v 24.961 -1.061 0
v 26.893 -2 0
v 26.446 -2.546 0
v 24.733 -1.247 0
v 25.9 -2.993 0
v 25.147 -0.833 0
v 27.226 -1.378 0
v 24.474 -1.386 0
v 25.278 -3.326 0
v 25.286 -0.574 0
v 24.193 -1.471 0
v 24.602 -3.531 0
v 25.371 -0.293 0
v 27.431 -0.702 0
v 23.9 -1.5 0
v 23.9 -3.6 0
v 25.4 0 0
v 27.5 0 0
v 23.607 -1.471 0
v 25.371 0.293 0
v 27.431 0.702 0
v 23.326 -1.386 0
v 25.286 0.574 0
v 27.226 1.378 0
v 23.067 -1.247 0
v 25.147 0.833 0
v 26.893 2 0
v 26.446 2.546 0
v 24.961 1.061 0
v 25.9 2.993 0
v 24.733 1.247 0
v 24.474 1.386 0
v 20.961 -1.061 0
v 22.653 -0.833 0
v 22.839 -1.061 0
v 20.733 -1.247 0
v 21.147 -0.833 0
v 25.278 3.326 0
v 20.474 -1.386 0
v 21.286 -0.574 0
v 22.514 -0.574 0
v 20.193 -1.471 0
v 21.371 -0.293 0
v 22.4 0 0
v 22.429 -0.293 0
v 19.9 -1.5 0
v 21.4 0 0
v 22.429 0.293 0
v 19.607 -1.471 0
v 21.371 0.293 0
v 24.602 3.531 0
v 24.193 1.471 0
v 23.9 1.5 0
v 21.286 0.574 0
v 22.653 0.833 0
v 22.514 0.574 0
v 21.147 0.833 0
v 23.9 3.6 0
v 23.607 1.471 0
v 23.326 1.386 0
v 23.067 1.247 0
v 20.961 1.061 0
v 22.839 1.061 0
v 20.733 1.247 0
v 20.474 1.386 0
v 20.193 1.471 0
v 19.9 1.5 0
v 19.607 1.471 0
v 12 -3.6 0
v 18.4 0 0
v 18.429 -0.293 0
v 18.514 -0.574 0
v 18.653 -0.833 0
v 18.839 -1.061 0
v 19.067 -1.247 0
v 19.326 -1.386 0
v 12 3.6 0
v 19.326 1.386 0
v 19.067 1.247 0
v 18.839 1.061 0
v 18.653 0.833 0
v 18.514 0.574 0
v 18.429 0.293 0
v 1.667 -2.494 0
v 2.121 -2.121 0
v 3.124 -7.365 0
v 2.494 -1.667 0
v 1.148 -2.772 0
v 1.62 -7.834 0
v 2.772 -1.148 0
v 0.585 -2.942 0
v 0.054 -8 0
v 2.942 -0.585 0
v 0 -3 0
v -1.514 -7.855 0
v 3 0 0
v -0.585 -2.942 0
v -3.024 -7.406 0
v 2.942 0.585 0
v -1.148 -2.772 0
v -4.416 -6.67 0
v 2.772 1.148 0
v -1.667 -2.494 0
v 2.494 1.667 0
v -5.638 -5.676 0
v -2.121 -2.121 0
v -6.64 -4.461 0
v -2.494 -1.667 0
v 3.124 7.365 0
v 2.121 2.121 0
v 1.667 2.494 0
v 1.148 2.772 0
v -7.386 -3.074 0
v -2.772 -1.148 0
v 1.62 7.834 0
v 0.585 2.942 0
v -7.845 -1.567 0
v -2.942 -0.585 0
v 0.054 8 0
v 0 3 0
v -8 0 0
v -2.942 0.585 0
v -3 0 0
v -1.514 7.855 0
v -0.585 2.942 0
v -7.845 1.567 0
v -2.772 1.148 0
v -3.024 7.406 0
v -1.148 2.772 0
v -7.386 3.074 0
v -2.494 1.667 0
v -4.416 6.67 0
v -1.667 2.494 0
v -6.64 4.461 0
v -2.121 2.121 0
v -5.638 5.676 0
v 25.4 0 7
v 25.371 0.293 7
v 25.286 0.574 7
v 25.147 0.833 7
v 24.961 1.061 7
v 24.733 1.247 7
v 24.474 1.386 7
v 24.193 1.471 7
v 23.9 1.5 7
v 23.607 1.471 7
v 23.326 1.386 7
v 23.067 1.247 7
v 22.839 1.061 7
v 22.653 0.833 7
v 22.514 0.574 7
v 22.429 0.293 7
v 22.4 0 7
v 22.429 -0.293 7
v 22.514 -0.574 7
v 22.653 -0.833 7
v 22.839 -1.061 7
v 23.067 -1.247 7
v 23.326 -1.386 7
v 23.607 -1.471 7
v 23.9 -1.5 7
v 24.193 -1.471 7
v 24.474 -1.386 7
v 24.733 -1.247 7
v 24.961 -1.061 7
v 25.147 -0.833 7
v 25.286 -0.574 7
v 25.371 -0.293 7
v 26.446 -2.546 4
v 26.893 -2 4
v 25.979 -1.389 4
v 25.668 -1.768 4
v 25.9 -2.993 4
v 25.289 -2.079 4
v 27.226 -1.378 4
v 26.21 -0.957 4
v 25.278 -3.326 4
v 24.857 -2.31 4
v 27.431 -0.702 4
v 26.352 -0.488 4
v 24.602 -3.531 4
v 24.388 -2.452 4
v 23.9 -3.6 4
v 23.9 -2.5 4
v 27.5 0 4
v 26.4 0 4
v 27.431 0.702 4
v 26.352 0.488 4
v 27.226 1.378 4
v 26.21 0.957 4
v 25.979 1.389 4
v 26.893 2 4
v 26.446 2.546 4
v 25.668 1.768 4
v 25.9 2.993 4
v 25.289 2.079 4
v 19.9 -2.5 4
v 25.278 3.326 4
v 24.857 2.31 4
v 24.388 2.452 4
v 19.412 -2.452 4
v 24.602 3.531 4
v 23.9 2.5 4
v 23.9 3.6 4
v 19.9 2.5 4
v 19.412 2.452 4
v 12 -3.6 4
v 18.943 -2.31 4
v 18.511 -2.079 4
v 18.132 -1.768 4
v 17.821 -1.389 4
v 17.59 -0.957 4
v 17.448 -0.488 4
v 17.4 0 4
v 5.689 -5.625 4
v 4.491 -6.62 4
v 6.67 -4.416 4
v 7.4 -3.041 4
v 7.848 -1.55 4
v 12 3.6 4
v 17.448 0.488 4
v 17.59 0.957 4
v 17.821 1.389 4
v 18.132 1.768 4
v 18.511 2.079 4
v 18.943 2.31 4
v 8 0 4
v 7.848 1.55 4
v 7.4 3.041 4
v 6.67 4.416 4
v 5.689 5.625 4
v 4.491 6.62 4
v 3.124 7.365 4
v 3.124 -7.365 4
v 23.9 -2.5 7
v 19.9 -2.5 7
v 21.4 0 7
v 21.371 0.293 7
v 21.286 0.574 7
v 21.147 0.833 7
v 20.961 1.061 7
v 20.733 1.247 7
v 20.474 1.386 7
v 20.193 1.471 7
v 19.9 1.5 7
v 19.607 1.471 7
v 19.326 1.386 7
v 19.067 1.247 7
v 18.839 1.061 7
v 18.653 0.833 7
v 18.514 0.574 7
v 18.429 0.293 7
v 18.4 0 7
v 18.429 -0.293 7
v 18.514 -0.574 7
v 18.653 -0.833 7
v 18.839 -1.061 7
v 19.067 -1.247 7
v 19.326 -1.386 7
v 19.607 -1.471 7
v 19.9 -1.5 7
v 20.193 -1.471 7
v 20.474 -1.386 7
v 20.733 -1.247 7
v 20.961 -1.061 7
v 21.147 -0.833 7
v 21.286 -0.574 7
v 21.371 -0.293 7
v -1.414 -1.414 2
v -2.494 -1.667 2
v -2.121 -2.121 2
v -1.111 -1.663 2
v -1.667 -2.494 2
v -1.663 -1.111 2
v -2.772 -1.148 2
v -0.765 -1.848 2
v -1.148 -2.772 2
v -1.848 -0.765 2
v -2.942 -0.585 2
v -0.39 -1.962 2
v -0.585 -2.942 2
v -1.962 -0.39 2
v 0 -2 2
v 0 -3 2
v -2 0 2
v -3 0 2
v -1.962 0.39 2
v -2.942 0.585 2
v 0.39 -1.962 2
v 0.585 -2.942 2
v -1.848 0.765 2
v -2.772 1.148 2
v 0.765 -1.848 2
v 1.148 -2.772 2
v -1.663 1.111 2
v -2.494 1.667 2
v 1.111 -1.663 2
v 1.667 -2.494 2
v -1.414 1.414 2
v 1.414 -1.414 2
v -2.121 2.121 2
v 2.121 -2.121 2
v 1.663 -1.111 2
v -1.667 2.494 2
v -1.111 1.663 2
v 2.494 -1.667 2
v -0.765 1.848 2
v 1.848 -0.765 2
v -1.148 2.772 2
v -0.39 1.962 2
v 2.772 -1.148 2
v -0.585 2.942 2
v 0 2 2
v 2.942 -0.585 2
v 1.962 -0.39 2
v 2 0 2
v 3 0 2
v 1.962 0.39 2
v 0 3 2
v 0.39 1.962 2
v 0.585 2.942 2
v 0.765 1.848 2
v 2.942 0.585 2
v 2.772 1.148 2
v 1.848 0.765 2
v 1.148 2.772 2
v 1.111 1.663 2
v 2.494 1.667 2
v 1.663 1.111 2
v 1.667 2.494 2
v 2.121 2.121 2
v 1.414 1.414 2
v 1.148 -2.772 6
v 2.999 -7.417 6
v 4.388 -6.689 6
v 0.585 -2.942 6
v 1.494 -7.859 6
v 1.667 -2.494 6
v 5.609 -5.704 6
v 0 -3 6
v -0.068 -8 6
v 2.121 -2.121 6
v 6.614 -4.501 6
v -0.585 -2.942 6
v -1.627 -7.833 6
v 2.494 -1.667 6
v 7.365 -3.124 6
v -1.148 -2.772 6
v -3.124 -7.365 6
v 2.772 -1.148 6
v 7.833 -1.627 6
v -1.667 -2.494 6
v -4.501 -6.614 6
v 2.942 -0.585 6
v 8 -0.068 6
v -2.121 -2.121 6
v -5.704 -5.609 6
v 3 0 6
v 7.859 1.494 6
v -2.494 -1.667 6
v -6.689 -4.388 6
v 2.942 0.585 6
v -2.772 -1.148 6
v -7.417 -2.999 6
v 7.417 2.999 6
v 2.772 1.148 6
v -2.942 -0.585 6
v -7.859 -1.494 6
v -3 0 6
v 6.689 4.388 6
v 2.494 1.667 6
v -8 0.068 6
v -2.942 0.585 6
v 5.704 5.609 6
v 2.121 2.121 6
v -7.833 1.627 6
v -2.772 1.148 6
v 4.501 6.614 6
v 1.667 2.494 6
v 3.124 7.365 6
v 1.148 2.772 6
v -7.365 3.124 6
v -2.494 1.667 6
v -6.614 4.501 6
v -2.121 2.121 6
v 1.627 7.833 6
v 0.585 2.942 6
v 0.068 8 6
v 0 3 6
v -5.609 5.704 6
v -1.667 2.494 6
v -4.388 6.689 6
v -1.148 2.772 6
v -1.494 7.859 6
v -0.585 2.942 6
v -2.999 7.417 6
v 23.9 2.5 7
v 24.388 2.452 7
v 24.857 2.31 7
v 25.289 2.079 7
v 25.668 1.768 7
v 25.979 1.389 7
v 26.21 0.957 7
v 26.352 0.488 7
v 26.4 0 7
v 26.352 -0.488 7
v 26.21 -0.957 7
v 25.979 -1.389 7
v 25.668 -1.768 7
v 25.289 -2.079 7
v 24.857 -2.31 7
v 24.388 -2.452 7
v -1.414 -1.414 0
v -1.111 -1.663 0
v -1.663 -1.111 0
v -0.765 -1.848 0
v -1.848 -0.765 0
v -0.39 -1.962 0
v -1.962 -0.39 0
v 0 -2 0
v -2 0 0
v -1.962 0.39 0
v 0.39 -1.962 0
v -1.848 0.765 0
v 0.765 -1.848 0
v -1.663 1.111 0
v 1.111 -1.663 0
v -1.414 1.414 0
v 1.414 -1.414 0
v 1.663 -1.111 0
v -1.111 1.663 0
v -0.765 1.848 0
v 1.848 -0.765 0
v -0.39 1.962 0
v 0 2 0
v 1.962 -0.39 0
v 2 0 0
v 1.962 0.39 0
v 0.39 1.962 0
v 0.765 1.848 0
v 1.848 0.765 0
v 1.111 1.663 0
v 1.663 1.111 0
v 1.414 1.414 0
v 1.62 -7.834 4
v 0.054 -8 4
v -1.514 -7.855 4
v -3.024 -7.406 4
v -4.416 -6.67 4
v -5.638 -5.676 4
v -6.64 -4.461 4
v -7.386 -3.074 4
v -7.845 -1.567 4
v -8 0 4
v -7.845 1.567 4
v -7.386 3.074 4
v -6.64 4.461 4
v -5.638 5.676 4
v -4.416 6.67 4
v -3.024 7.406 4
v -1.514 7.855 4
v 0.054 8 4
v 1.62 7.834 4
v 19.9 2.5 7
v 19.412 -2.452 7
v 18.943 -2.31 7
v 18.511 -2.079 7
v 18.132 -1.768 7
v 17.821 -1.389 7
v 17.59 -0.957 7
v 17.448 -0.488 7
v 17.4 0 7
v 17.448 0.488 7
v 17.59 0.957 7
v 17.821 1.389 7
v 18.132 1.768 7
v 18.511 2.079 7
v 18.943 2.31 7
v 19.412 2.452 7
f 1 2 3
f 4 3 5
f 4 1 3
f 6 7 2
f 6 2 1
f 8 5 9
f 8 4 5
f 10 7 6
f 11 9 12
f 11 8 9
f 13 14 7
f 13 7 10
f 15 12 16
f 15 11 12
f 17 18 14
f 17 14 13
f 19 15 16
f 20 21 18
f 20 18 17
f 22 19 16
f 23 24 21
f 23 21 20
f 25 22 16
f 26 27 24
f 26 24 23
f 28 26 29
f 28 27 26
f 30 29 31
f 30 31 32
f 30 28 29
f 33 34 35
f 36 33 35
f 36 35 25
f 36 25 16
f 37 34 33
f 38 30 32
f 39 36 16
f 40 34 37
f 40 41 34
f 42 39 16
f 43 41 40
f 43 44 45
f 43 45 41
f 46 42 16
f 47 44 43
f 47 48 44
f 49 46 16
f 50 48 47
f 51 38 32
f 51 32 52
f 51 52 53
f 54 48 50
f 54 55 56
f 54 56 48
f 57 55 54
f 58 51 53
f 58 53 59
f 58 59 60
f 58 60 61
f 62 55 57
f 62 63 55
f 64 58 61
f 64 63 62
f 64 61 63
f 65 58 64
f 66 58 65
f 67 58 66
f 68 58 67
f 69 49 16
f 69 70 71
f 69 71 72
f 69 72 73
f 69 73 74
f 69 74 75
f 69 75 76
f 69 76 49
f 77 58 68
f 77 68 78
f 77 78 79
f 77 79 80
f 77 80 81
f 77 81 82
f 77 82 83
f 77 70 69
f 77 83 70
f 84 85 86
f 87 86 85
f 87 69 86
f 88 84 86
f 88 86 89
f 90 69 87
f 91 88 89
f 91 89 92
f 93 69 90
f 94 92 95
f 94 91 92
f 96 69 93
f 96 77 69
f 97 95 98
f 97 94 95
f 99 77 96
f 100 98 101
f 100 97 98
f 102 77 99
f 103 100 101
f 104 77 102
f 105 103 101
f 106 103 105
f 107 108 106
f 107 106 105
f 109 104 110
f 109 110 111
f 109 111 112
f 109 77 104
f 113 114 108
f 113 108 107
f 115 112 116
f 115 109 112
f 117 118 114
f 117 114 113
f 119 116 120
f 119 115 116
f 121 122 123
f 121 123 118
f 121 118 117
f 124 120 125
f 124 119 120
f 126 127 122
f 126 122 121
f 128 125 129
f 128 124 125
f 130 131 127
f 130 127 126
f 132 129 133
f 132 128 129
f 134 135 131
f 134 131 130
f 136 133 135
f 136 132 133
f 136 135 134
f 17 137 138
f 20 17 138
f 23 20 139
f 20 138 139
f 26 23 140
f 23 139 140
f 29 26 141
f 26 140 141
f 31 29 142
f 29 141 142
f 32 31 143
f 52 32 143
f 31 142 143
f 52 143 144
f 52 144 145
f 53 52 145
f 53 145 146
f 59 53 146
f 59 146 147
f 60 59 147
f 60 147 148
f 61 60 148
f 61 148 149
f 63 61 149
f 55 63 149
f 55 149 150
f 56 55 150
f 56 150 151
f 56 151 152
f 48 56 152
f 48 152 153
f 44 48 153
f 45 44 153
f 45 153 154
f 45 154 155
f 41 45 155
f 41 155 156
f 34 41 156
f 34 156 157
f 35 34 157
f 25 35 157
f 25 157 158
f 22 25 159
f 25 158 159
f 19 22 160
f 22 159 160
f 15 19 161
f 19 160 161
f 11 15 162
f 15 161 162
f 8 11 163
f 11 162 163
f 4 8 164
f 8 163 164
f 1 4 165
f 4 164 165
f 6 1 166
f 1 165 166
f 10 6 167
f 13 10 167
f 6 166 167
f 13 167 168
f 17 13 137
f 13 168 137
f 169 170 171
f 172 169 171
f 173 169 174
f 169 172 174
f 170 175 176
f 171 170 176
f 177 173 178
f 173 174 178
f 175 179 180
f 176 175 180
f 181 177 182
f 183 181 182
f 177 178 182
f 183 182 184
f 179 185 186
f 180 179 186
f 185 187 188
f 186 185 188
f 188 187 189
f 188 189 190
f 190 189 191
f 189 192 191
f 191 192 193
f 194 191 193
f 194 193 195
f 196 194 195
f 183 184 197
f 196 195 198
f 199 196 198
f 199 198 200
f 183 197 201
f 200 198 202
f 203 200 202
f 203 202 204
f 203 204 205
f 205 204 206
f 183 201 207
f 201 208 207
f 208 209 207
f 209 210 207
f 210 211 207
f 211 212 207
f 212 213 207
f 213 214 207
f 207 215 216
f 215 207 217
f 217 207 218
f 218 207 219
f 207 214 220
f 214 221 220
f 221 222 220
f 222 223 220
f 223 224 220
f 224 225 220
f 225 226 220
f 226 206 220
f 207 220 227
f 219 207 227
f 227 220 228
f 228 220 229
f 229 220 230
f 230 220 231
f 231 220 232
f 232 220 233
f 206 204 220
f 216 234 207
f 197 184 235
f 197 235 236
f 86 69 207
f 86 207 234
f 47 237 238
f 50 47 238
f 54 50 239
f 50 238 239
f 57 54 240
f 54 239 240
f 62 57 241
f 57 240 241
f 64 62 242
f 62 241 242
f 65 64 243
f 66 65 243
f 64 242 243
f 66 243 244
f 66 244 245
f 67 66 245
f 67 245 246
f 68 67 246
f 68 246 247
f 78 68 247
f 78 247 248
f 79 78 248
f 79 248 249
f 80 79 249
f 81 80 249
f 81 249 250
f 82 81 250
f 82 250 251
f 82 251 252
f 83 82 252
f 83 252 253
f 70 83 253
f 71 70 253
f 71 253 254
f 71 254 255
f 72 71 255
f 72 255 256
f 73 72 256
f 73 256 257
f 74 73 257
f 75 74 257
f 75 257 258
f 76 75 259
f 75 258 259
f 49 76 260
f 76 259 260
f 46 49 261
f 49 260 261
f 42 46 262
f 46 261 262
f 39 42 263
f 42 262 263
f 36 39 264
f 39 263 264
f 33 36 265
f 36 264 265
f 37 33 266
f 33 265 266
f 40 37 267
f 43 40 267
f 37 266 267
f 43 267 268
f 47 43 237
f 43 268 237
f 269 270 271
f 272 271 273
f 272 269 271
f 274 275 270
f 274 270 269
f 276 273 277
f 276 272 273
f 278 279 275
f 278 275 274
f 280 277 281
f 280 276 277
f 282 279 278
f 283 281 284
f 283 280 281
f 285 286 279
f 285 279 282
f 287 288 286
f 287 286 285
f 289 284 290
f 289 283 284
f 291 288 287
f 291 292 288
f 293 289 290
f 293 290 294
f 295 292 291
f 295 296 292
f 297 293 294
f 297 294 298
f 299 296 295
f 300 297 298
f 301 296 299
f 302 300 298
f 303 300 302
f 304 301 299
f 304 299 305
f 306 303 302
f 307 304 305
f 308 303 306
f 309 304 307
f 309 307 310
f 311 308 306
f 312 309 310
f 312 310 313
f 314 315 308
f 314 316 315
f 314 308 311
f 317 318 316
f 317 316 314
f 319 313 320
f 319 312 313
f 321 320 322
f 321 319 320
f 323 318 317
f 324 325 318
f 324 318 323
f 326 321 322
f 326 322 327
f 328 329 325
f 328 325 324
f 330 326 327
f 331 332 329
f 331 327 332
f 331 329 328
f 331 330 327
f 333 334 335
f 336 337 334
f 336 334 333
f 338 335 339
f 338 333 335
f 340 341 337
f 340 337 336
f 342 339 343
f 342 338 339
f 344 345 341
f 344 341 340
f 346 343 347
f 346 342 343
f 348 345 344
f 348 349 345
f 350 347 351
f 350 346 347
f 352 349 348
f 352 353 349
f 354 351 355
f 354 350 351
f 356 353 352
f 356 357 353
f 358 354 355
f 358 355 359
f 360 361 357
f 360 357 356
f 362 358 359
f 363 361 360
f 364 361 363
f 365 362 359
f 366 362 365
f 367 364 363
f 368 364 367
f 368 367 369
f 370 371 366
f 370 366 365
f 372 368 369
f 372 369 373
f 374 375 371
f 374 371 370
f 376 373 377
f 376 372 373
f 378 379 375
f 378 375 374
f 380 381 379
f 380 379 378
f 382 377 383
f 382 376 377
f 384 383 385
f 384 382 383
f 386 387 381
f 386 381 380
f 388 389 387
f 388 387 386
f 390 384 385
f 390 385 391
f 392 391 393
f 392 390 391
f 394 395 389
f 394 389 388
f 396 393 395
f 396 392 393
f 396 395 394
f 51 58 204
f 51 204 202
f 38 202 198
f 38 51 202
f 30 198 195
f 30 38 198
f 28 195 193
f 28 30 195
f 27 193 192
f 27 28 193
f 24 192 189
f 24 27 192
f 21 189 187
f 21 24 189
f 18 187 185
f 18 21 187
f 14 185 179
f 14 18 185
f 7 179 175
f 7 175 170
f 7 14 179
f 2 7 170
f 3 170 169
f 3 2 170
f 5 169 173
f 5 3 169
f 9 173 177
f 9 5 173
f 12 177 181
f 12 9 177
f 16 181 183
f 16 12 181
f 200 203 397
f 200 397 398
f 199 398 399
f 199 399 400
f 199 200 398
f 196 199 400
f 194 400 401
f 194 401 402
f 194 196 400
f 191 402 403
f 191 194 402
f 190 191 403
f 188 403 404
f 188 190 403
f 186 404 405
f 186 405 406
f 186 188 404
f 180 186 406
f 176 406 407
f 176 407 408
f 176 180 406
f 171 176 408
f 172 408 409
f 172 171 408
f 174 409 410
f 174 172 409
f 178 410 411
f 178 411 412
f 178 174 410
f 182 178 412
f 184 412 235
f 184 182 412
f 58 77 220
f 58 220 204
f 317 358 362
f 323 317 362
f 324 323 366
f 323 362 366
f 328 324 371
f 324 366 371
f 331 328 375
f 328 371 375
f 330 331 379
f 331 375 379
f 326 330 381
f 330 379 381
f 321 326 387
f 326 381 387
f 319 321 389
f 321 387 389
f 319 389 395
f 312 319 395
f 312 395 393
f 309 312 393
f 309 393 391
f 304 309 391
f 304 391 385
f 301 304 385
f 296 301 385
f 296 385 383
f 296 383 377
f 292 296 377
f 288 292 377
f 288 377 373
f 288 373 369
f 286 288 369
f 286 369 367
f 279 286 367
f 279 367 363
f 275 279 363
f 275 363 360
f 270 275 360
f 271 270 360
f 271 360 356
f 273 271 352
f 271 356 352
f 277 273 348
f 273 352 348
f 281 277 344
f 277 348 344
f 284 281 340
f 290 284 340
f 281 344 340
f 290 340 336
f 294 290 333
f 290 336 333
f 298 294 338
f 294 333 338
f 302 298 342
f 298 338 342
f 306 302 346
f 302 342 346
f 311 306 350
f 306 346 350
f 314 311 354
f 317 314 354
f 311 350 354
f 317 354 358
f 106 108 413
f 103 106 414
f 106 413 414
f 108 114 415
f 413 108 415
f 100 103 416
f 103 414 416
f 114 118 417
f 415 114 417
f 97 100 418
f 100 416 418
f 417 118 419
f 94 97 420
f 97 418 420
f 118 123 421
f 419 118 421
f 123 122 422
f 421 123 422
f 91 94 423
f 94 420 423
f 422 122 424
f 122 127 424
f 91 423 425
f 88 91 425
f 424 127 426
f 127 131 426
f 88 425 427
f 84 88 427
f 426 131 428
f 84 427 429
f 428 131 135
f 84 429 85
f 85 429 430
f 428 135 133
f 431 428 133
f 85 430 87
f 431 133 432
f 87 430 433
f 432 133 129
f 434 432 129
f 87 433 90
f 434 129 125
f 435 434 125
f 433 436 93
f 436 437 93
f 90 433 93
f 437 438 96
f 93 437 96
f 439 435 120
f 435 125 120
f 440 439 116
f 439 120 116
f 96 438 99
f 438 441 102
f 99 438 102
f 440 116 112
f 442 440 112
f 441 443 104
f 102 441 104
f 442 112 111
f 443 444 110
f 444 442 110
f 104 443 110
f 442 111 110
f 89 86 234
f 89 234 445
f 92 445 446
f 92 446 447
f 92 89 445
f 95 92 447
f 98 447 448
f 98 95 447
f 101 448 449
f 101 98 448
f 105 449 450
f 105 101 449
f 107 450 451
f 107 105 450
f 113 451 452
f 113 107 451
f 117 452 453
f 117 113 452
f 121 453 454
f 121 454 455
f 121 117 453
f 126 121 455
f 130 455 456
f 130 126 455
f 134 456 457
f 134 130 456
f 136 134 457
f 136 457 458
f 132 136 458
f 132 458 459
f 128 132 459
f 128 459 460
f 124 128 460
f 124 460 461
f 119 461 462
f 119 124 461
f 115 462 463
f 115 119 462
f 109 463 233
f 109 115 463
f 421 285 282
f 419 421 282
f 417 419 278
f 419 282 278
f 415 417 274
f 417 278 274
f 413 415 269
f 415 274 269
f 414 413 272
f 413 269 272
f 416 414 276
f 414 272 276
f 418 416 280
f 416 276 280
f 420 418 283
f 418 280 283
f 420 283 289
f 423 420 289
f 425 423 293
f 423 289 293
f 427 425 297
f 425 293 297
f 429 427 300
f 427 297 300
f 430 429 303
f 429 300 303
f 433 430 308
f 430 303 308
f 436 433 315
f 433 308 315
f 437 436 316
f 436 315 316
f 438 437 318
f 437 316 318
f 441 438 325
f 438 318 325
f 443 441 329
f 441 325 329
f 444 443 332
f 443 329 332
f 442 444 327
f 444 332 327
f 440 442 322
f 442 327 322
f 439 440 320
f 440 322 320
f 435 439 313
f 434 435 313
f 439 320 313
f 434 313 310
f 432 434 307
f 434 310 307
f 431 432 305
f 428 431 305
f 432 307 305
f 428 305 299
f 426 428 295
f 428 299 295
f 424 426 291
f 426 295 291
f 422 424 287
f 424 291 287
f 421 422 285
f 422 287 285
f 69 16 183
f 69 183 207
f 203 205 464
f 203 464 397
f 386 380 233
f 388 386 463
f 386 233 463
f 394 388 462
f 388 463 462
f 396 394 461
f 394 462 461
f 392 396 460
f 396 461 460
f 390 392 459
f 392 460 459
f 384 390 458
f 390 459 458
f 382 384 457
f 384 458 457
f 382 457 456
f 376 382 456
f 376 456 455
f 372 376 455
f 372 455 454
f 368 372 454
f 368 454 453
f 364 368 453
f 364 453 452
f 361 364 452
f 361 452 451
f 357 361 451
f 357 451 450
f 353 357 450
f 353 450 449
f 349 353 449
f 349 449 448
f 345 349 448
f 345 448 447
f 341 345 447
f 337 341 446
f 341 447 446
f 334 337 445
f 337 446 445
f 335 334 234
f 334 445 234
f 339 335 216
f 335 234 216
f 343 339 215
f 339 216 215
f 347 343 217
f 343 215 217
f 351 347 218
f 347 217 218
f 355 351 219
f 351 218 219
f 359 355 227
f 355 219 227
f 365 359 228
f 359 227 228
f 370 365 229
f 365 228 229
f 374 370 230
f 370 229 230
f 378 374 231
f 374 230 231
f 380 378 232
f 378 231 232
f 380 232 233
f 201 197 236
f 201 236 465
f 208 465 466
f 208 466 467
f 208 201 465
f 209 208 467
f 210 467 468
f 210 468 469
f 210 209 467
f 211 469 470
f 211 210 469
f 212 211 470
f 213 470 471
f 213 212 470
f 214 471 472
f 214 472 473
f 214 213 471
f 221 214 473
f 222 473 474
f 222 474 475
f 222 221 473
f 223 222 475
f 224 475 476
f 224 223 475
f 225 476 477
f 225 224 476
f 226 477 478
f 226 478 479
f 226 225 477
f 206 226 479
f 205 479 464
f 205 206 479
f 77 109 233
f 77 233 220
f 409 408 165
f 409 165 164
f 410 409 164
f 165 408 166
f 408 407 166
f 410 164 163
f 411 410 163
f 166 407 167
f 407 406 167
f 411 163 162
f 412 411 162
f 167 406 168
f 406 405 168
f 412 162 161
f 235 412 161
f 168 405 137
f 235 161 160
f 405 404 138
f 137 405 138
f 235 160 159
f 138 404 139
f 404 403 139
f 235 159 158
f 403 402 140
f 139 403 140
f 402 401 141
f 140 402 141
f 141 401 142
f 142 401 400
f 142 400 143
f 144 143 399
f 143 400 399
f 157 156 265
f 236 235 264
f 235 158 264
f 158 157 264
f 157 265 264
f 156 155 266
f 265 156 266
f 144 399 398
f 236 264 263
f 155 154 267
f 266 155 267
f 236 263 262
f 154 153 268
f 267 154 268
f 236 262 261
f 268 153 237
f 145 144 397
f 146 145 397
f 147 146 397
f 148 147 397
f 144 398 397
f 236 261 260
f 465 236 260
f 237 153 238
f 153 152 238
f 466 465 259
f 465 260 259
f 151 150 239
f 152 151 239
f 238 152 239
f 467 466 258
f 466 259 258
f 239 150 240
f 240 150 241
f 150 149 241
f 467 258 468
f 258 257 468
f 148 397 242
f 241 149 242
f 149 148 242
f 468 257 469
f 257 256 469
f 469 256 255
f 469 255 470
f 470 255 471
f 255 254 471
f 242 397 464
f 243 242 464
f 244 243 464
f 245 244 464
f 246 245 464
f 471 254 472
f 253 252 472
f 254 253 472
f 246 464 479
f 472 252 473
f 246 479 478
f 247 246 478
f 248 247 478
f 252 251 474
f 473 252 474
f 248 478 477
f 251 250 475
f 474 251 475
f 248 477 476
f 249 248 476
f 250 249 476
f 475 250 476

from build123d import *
from build123d.topology import SkipClean

# Parameters (mm, degrees)
BOSS_EXTRUDE1_DEPTH      = 4
SKETCH4_R                = 8
BOSS_EXTRUDE2_DEPTH      = 2
BOSS_EXTRUDE3_DEPTH      = 3
F_3_0_3_DIAMETER_HOLE1_D = 3
F_6_0_6_DIAMETER_HOLE1_D = 6
BOSS_EXTRUDE4_START      = 2
SKETCH12_R               = 3
SKETCH12_R_2             = 2
BOSS_EXTRUDE4_DEPTH      = 2


with BuildPart() as part:
    # Sketch1 → Boss-Extrude1 (new body)
    with BuildSketch(Plane.XY):
        with BuildLine():
            Line((3.123869731, 7.364878676), (12, 3.6))
            Line((12, 3.6), (23.9, 3.6))
            ThreePointArc((23.9, 3.6), (27.5, 0), (23.9, -3.6))
            Line((23.9, -3.6), (12, -3.6))
            Line((12, -3.6), (3.123869731, -7.364878676))
            ThreePointArc((3.123869731, -7.364878676), (-8, 0), (3.123869731, 7.364878676))
        make_face()
    extrude(amount=BOSS_EXTRUDE1_DEPTH)

    # Sketch4 → Boss-Extrude2 (add)
    with SkipClean():  # the faces are left unmerged after this step: merging them gives an invalid solid
        with BuildSketch(Plane.XY.offset(4)):
            with Locations(Location((0, 0, 0), (0, 0, 67.015399011))):
                Circle(SKETCH4_R)
        extrude(amount=BOSS_EXTRUDE2_DEPTH)

    # Sketch5 → Boss-Extrude3 (add)
    with SkipClean():  # the faces are left unmerged after this step: merging them gives an invalid solid
        with BuildSketch(Plane.XY.offset(4)):
            with BuildLine():
                Line((23.9, -2.5), (19.9, -2.5))
                ThreePointArc((19.9, -2.5), (17.4, 0), (19.9, 2.5))
                Line((19.9, 2.5), (23.9, 2.5))
                ThreePointArc((23.9, 2.5), (26.4, 0), (23.9, -2.5))
            make_face()
        extrude(amount=BOSS_EXTRUDE3_DEPTH)

    # Ø3.0 (3) Diameter Hole1 (through all)
    with Locations(Plane(origin=(0, 0, 0), x_dir=(-1, 0, 0), z_dir=(0, 0, -1))):
        with Locations((-23.9, 0), (-19.9, 0)):
            Hole(F_3_0_3_DIAMETER_HOLE1_D / 2)

    # Ø6.0 (6) Diameter Hole1 (through all)
    with Locations(Plane(origin=(0, 0, 0), x_dir=(-1, 0, 0), z_dir=(0, 0, -1))):
        with Locations((0, 0)):
            Hole(F_6_0_6_DIAMETER_HOLE1_D / 2)

    # Sketch12 → Boss-Extrude4 (add)
    with SkipClean():  # the faces are left unmerged after this step: merging them gives an invalid solid
        with BuildSketch(Plane.XY.offset(BOSS_EXTRUDE4_START)):
            Circle(SKETCH12_R)
            with Locations(Location((0, 0, 0), (0, 0, 180))):
                Circle(SKETCH12_R_2, mode=Mode.SUBTRACT)
        extrude(amount=-BOSS_EXTRUDE4_DEPTH)


solid = part.part
